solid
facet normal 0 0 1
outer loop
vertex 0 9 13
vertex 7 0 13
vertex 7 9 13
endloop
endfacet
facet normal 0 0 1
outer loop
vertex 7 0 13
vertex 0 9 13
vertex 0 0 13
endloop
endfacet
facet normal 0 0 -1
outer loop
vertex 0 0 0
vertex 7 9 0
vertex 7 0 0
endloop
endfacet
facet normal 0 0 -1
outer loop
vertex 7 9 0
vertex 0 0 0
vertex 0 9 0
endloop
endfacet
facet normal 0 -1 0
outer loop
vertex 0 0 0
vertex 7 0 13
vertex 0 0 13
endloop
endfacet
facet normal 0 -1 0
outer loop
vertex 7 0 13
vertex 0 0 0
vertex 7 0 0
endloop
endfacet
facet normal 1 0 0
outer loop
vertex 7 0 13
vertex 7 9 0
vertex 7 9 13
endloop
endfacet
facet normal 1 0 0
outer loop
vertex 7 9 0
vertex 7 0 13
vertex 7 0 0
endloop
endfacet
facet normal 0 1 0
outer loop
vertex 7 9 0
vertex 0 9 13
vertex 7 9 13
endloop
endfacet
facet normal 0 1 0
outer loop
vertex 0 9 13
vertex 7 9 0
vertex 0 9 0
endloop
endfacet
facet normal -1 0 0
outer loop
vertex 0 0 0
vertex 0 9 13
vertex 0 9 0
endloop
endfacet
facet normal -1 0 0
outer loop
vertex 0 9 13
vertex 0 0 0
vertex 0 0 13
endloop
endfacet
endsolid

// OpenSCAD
// Generated by SolidPython 1.0.1 on 2020-07-29 00:39:26


cube(size = [7, 9, 13]);
/***********************************************
*********      SolidPython code:      **********
************************************************
 
# import packages: SolidPython
from solid import *
from solid.utils import *
from itertools import chain, combinations


class Resize:

    def __init__(self, scad_file):
        self.scad_file = scad_file
        #self.scad_file = import_scad(scad_file)
        # cone/cylinder param:
        self.r1 = 0
        self.r2 = 0
        self.h = 0
        # rectangular prism param:
        self.w = 0
        self.l = 0
        # ellipse param:
        self.r = 0

    # import OpenScad code (file name corresponds to shape)


    # classify shape + parameters
    def assign(self, param1, param2, param3):
        if self.scad_file == 'cone.scad':
            self.r1 = param1
            self.r2 = param2
            self.h = param3
        elif self.scad_file == 'cylinder.scad':
            self.r1 = param1
            self.r2 = param2
            self.h = param3
        elif self.scad_file == 'rectangularPrism.scad':
            self.h = param1
            self.l = param2
            self.w = param3
        else:
            self.r = param1
            self.h = param2

    # resize parameters
    def iterate(self):
        x = range(3, 20, 2)
        i = 1
        if self.scad_file == 'cone.scad':
            tempList = list(combinations(x, 2))
            for temp in tempList:
                param1 = temp[0]
                param2 = temp[1]
                filepath = 'produced_scad_files/' + 'cone' + str(param1) + '_' + str(param2) + '_' + '.scad'
                scad_render_to_file(cylinder(h=param1, r1=param2, r2=0), filepath)

        elif self.scad_file == 'cylinder.scad':
            tempList = list(combinations(x, 3))
            for temp in tempList:
                param1 = temp[0]
                param2 = temp[1]
                filepath = 'produced_scad_files/' + 'cylinder' + str(param1) + '_' + str(param2) + '_' + '.scad'
                scad_render_to_file(cylinder(h=param1, r1=param2, r2=param2), filepath)

        elif self.scad_file == 'rectangularPrism.scad':
            tempList = list(combinations(x, 3))
            for temp in tempList:
                param1 = temp[0]
                param2 = temp[1]
                param3 = temp[2]
                filepath = 'produced_scad_files/' + 'rectangularPrism' + str(param1) + '_' + str(param2) + '_' + str(
                    param3) + '.scad'
                scad_render_to_file(cube(size=(param1, param2, param3)), filepath)

        elif self.scad_file == 'ellipse.scad':
            tempList = list(combinations(x, 4))
            for temp in tempList:
                param1 = temp[0]
                param2 = temp[1]
                param3 = temp[2]
                param4 = temp[3]
                filepath = 'produced_scad_files/' + 'ellipse' + str(param1) + '_' + str(param2) + '_' + str(param3) + '_' + str(param4) + '.scad'
                scad_render_to_file(scale([param1, param2, param3])(sphere(r=param4)), filepath)

    def render_to_scadfile(self):
        scad_render_to_file(scad, 'example.scad') 
 
************************************************/
